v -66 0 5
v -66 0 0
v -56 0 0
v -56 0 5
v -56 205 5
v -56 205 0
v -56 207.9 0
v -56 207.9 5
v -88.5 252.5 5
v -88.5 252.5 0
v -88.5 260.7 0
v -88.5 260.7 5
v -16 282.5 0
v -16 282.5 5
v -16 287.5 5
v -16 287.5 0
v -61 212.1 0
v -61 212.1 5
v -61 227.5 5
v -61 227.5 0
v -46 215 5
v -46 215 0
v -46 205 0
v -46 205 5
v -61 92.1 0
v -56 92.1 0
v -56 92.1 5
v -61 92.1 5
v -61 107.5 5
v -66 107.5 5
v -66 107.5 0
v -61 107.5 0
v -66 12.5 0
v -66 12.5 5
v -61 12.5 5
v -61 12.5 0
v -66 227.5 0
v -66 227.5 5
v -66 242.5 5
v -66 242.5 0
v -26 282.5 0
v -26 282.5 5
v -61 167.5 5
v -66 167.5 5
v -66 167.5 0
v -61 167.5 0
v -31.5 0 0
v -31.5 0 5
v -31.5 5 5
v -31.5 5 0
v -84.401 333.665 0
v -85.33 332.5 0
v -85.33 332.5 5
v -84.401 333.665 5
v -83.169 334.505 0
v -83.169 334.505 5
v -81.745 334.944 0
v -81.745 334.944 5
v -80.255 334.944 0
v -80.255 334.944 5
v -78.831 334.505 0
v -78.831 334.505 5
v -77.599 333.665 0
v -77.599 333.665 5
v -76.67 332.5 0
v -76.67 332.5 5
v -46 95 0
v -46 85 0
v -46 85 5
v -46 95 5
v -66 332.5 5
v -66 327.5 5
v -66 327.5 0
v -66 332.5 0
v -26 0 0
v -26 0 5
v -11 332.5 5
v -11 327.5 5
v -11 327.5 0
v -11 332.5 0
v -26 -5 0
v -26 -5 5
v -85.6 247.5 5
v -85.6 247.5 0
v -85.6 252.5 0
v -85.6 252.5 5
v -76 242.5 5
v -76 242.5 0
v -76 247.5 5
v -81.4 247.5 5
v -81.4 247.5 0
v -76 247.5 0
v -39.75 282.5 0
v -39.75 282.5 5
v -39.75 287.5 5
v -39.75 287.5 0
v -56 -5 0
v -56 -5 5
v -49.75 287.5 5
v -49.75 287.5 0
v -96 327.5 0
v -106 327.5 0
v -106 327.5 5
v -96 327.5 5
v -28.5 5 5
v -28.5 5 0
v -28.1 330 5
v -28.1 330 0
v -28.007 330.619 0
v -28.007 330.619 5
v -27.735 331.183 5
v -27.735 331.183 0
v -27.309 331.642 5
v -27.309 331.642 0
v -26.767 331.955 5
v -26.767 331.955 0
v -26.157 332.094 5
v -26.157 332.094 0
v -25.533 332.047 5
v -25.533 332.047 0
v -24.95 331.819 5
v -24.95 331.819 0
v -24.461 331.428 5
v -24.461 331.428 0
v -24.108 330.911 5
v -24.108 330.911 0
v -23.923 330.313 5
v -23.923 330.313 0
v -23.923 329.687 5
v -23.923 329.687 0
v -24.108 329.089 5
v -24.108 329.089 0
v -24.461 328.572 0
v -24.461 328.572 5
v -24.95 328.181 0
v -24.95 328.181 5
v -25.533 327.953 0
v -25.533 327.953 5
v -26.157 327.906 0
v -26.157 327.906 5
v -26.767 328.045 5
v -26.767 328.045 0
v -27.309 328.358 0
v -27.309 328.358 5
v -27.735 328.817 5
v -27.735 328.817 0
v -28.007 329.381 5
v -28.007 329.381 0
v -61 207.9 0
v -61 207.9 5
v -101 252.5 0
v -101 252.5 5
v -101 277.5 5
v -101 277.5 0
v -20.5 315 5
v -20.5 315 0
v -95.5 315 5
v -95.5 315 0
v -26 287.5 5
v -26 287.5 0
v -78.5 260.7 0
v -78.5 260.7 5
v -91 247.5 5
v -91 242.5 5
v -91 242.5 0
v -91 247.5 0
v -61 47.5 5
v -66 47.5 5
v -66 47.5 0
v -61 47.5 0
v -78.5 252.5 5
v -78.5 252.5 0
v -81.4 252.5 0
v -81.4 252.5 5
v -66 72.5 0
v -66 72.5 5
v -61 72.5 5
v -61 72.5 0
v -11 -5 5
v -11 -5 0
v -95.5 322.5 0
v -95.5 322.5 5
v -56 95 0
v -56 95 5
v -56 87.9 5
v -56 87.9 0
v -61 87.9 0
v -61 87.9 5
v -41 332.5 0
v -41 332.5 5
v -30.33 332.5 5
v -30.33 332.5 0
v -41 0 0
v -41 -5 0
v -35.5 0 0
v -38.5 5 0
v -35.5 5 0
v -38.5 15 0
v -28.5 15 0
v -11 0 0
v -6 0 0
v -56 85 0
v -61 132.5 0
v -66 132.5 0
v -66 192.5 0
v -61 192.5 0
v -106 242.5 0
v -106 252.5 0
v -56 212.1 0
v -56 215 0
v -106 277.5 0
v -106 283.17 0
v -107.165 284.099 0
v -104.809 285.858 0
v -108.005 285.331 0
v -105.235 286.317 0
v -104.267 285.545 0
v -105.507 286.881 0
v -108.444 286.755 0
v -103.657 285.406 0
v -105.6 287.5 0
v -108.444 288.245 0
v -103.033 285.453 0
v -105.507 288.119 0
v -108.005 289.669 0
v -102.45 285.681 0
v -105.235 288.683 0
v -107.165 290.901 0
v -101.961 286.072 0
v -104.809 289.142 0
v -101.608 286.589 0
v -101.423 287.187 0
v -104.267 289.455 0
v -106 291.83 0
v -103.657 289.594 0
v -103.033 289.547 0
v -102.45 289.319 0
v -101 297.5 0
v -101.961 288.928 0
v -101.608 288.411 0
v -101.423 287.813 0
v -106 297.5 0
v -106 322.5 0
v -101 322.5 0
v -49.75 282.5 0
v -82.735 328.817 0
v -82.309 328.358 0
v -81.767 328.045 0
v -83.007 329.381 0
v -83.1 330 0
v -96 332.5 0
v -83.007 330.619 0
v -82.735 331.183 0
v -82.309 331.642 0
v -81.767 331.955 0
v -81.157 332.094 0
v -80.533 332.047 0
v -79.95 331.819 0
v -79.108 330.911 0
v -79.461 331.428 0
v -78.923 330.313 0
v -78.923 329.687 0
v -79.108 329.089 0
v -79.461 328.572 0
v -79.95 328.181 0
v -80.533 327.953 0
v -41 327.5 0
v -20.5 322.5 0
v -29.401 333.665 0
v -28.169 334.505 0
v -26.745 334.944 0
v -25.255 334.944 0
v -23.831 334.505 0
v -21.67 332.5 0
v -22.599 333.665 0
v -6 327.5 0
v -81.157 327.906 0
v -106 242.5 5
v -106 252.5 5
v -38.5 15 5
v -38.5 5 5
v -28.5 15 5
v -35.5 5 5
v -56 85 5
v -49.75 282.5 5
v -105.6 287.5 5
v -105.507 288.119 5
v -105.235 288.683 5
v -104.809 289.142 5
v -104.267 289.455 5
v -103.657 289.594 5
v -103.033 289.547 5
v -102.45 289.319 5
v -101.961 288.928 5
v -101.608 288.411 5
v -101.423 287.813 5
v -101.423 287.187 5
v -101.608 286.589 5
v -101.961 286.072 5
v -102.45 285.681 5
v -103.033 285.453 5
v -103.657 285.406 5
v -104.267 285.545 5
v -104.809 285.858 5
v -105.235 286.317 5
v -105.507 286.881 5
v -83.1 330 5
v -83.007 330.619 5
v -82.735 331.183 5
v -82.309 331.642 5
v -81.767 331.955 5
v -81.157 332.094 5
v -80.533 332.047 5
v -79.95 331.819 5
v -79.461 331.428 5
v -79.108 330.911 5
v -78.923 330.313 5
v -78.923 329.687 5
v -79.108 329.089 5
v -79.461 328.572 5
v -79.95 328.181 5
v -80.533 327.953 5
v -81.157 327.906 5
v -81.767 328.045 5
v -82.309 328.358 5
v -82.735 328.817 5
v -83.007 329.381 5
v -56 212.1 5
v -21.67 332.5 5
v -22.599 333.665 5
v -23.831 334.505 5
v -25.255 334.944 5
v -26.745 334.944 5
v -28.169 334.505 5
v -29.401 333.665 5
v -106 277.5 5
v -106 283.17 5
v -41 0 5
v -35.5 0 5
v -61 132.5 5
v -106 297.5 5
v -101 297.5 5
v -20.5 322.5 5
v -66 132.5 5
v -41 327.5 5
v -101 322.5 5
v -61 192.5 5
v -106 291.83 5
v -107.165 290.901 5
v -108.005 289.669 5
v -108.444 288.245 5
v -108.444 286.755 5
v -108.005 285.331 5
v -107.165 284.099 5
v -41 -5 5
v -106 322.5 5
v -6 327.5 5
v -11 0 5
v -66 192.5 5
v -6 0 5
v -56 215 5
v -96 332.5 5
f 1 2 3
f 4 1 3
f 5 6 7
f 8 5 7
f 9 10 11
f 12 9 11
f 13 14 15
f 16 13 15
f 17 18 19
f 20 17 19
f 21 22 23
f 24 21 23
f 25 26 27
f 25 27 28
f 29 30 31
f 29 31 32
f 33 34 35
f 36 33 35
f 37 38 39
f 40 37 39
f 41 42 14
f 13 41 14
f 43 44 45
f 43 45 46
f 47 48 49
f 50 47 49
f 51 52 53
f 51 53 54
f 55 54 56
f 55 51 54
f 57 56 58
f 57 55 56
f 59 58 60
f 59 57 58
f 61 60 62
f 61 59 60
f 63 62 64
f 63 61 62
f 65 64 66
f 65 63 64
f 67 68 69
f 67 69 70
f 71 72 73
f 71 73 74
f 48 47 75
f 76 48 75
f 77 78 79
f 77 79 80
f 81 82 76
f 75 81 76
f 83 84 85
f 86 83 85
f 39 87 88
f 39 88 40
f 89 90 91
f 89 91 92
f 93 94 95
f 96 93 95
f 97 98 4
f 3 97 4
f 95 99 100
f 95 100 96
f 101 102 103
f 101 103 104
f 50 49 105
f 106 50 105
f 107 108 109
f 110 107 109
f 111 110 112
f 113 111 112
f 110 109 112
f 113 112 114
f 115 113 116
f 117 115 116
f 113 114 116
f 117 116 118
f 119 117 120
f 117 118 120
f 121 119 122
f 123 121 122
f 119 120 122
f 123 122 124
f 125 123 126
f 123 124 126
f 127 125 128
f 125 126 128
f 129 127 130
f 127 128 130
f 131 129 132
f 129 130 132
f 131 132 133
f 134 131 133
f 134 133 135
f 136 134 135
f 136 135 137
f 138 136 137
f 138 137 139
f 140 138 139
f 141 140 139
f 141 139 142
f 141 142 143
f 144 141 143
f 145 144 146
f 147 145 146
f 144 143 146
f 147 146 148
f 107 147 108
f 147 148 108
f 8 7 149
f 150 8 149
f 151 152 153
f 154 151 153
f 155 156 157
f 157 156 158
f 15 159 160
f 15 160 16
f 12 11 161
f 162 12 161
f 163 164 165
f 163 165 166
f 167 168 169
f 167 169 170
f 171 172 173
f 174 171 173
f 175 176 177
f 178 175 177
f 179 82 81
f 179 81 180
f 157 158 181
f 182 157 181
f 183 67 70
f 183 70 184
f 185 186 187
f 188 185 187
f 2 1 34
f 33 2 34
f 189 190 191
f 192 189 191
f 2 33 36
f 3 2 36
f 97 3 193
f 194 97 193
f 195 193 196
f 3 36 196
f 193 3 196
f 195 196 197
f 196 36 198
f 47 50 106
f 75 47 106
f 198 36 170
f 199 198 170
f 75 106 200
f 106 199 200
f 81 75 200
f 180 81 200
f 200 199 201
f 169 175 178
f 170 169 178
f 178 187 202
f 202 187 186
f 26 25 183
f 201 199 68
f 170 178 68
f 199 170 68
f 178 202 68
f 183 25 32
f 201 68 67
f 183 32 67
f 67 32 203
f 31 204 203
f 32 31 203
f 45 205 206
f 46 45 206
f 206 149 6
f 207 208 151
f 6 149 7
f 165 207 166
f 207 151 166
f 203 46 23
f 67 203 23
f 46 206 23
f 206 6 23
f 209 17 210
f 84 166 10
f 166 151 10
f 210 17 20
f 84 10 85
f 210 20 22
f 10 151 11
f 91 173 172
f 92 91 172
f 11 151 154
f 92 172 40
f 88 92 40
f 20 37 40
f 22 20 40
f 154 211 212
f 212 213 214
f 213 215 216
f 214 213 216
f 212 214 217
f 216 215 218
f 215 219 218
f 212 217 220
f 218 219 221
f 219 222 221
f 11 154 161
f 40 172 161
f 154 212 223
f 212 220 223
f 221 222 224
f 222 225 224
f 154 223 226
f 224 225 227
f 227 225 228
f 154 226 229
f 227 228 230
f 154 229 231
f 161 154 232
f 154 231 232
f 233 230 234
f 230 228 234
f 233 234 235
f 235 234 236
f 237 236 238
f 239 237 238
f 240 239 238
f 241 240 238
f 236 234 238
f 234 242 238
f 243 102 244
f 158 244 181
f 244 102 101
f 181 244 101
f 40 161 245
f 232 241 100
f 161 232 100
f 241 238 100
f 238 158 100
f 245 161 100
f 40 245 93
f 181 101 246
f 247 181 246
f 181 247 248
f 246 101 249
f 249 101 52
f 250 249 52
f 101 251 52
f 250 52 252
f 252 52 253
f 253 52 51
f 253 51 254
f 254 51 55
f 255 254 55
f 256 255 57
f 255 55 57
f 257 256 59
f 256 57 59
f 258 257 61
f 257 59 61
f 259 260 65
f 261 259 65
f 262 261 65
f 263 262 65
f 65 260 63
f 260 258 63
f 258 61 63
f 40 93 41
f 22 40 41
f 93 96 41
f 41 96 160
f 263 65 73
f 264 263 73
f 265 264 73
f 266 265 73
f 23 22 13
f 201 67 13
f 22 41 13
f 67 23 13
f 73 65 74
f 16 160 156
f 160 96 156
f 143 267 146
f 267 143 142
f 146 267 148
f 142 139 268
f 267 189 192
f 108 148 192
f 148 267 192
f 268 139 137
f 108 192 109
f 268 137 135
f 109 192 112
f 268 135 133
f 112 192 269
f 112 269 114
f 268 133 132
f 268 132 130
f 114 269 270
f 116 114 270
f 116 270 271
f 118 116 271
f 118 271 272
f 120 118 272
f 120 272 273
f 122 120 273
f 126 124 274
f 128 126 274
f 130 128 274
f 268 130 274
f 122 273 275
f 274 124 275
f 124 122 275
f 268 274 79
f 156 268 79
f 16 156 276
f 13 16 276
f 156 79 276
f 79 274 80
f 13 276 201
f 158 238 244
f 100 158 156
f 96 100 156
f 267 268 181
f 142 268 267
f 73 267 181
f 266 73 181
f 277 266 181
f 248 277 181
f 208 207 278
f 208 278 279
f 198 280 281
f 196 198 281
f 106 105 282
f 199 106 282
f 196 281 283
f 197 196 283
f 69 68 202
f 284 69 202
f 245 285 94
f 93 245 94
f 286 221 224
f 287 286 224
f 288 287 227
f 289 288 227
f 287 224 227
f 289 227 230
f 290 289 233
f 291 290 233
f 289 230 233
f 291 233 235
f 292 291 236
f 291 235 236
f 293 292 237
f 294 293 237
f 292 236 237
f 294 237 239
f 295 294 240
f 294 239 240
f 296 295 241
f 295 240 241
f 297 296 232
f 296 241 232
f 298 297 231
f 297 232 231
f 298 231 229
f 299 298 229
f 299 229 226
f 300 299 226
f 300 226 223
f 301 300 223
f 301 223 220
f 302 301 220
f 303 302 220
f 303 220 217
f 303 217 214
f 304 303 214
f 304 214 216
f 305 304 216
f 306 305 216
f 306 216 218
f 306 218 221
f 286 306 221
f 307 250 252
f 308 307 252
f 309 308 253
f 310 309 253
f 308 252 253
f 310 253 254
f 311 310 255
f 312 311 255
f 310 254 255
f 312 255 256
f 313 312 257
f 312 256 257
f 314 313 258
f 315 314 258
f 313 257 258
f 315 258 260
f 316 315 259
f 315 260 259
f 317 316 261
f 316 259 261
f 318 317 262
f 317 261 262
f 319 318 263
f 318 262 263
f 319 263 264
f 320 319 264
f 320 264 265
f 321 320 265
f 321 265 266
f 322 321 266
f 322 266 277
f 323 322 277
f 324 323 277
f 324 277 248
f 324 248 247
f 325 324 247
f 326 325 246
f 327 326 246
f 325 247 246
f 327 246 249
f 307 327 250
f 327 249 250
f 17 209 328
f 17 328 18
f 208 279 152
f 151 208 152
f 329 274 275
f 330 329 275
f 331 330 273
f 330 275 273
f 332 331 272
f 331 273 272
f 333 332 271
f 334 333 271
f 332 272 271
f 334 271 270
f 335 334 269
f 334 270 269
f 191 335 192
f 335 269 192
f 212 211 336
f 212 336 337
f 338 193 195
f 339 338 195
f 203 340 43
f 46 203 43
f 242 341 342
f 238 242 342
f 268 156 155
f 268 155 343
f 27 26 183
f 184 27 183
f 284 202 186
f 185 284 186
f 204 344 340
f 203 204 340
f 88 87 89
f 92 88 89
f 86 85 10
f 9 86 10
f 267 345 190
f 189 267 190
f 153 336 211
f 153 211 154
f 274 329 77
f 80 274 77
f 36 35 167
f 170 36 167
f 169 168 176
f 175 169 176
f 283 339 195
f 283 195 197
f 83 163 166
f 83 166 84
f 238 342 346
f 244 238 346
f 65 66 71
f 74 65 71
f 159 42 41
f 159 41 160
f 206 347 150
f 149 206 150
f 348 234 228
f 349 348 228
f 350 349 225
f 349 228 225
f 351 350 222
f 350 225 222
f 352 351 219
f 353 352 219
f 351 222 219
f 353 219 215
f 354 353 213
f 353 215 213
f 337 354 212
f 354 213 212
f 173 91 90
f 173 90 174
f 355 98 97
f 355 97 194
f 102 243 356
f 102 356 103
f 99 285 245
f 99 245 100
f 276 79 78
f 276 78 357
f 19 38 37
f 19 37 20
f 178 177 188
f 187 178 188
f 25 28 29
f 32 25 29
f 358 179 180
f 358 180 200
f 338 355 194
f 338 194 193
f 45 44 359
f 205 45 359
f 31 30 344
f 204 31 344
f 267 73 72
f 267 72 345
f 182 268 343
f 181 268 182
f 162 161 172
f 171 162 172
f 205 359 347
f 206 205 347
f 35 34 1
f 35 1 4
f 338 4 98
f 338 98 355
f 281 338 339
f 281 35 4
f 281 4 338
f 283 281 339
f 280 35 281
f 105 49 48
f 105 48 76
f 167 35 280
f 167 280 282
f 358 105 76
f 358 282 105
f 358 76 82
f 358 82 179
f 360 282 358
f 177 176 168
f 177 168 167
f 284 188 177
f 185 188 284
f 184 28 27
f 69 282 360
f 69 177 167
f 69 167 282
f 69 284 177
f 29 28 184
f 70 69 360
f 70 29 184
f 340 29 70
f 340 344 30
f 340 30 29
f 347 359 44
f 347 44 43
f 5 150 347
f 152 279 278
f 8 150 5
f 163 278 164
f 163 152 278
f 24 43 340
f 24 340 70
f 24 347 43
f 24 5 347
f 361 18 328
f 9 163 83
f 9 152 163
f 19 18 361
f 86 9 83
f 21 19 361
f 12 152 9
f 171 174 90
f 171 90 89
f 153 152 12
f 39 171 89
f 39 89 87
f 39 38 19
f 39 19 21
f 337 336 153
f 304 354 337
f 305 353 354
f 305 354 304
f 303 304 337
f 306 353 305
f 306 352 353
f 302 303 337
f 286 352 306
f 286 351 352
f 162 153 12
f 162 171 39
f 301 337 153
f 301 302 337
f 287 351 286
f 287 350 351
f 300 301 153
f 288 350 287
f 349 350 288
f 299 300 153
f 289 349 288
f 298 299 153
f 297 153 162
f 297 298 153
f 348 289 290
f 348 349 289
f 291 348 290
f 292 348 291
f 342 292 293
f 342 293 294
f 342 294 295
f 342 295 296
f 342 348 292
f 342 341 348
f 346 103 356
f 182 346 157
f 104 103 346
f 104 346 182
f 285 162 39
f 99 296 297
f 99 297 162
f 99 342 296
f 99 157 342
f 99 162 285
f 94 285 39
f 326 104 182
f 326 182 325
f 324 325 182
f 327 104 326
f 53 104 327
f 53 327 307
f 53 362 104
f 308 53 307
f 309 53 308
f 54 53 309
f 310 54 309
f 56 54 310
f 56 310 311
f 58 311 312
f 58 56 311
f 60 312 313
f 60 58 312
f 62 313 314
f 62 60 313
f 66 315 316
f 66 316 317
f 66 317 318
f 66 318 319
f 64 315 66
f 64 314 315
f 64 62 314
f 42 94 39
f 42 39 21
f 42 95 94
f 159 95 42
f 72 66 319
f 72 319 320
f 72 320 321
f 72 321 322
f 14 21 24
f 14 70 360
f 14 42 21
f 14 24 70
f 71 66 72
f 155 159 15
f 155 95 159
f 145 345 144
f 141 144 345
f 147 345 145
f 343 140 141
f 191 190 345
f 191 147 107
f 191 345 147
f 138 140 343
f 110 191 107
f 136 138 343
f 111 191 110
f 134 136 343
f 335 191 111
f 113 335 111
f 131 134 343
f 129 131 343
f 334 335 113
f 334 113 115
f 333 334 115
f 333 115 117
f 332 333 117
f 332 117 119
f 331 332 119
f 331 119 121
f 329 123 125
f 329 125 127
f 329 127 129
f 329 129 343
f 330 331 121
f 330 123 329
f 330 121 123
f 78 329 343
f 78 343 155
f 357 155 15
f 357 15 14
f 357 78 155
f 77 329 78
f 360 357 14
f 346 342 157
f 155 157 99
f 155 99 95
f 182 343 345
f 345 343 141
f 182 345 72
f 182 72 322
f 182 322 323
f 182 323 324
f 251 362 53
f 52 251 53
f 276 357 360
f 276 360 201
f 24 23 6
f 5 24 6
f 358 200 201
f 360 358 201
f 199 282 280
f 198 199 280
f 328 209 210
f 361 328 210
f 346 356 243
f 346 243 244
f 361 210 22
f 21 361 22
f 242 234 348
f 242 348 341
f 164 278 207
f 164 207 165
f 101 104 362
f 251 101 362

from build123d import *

# Parameters (mm, degrees)
SKETCH1_W           = 106
SKETCH1_H           = 327.5
BOSS_EXTRUDE1_DEPTH = 5
SKETCH2_W           = 40
SKETCH2_H           = 242.5
CUT_EXTRUDE1_DEPTH  = 5
SKETCH3_W           = 5
SKETCH3_H           = 25
CUT_EXTRUDE2_DEPTH  = 5
SKETCH4_W           = 30
SKETCH4_H           = 5
BOSS_EXTRUDE2_DEPTH = 5
SKETCH5_W           = 15
SKETCH5_H           = 5
CUT_EXTRUDE3_DEPTH  = 5
SKETCH6_W           = 5
SKETCH6_H           = 35
CUT_EXTRUDE4_DEPTH  = 5
SKETCH7_W           = 10
SKETCH7_H           = 5
CUT_EXTRUDE5_DEPTH  = 5
SKETCH8_W           = 15
SKETCH8_H           = 5
BOSS_EXTRUDE3_DEPTH = 5
SKETCH9_W           = 70
SKETCH9_H           = 7.5
CUT_EXTRUDE6_DEPTH  = 5
SKETCH10_W          = 5
SKETCH10_H          = 227.5
BOSS_EXTRUDE4_DEPTH = 5
SKETCH11_R          = 2.1
CUT_EXTRUDE7_DEPTH  = 5
BOSS_EXTRUDE5_DEPTH = 5
SKETCH13_W          = 10
SKETCH13_H          = 327.5
SKETCH13_W_2        = 11.118393302
SKETCH13_H_2        = 31.265749724
SKETCH13_W_3        = 24.993123917
SKETCH13_H_3        = 36.030112223
CUT_EXTRUDE8_DEPTH  = 10
SKETCH14_W          = 5
SKETCH14_H          = 327.5
CUT_EXTRUDE9_DEPTH  = 1
SKETCH15_W          = 4.2
SKETCH15_H          = 5
SKETCH15_W_2        = 5
SKETCH15_H_2        = 4.2
SKETCH15_W_3        = 10
SKETCH15_H_3        = 10
CUT_EXTRUDE10_DEPTH = 10
SKETCH16_R          = 2.1
CUT_EXTRUDE11_DEPTH = 10
BOSS_EXTRUDE6_DEPTH = 5
SKETCH19_W          = 4
SKETCH19_H          = 5
CUT_EXTRUDE13_DEPTH = 5
SKETCH20_R          = 2.1
CUT_EXTRUDE14_DEPTH = 5
BOSS_EXTRUDE7_DEPTH = 5
SKETCH22_W          = 5
SKETCH22_H          = 7.5
CUT_EXTRUDE15_DEPTH = 5


with BuildPart() as part:
    # Sketch1 → Boss-Extrude1 (new body)
    with BuildSketch(Plane.XY):
        with Locations((-53, 163.75)):
            Rectangle(SKETCH1_W, SKETCH1_H)
    extrude(amount=BOSS_EXTRUDE1_DEPTH)

    # Sketch2 → Cut-Extrude1 (cut)
    with BuildSketch(Plane.XY.offset(5)):
        with Locations((-86, 121.25)):
            Rectangle(SKETCH2_W, SKETCH2_H)
    extrude(amount=-CUT_EXTRUDE1_DEPTH, mode=Mode.SUBTRACT)

    # Sketch3 → Cut-Extrude2 (cut)
    with BuildSketch(Plane.XY.offset(5)):
        with Locations((-103.5, 310)):
            Rectangle(SKETCH3_W, SKETCH3_H)
        with Locations((-103.5, 265)):
            Rectangle(SKETCH3_W, SKETCH3_H)
    extrude(amount=-CUT_EXTRUDE2_DEPTH, mode=Mode.SUBTRACT)

    # Sketch4 → Boss-Extrude2 (add)
    with BuildSketch(Plane.XY.offset(5)):
        with Locations((-26, 330)):
            Rectangle(SKETCH4_W, SKETCH4_H)
        with Locations((-81, 330)):
            Rectangle(SKETCH4_W, SKETCH4_H)
    extrude(amount=-BOSS_EXTRUDE2_DEPTH)

    # Sketch5 → Cut-Extrude3 (cut)
    with BuildSketch(Plane.XY.offset(5)):
        with Locations((-83.5, 245)):
            Rectangle(SKETCH5_W, SKETCH5_H)
    extrude(amount=-CUT_EXTRUDE3_DEPTH, mode=Mode.SUBTRACT)

    # Sketch6 → Cut-Extrude4 (cut)
    with BuildSketch(Plane.XY.offset(5)):
        with Locations((-63.5, 210)):
            Rectangle(SKETCH6_W, SKETCH6_H)
        with Locations((-63.5, 150)):
            Rectangle(SKETCH6_W, SKETCH6_H)
        with Locations((-63.5, 90)):
            Rectangle(SKETCH6_W, SKETCH6_H)
        with Locations((-63.5, 30)):
            Rectangle(SKETCH6_W, SKETCH6_H)
    extrude(amount=-CUT_EXTRUDE4_DEPTH, mode=Mode.SUBTRACT)

    # Sketch7 → Cut-Extrude5 (cut)
    with BuildSketch(Plane.XY.offset(5)):
        with Locations((-21, 285)):
            Rectangle(SKETCH7_W, SKETCH7_H)
        with Locations((-44.75, 285)):
            Rectangle(SKETCH7_W, SKETCH7_H)
    extrude(amount=-CUT_EXTRUDE5_DEPTH, mode=Mode.SUBTRACT)

    # Sketch8 → Boss-Extrude3 (add)
    with BuildSketch(Plane.XY.offset(5)):
        with Locations((-18.5, -2.5)):
            Rectangle(SKETCH8_W, SKETCH8_H)
        with Locations((-48.5, -2.5)):
            Rectangle(SKETCH8_W, SKETCH8_H)
    extrude(amount=-BOSS_EXTRUDE3_DEPTH)

    # Sketch9 → Cut-Extrude6 (cut)
    with BuildSketch(Plane(origin=(0, 0, 0), x_dir=(-1, 0, 0), z_dir=(0, 0, -1))):
        with Locations((55.5, 318.75)):
            Rectangle(SKETCH9_W, SKETCH9_H)
    extrude(amount=-CUT_EXTRUDE6_DEPTH, mode=Mode.SUBTRACT)

    # Sketch10 → Boss-Extrude4 (add)
    with BuildSketch(Plane(origin=(0, 0, 0), x_dir=(-1, 0, 0), z_dir=(0, 0, -1))):
        with Locations((-2.5, 163.75)):
            Rectangle(SKETCH10_W, SKETCH10_H)
    extrude(amount=-BOSS_EXTRUDE4_DEPTH)

    # Sketch11 → Cut-Extrude7 (cut)
    with BuildSketch(Plane(origin=(0, 0, 0), x_dir=(-1, 0, 0), z_dir=(0, 0, -1))):
        with Locations((-2.5, 75)):
            Circle(SKETCH11_R)
        with Locations((-2.5, 252.5)):
            Circle(SKETCH11_R)
    extrude(amount=-CUT_EXTRUDE7_DEPTH, mode=Mode.SUBTRACT)

    # Sketch12 → Boss-Extrude5 (add)
    with BuildSketch(Plane(origin=(0, 0, 0), x_dir=(-1, 0, 0), z_dir=(0, 0, -1))):
        with BuildLine():
            Line((-5, 70.669872981), (-5, 79.330127019))
            ThreePointArc((-5, 79.330127019), (-7.5, 75), (-5, 70.669872981))
        make_face()
        with BuildLine():
            Line((-5, 256.830127019), (-5, 248.169872981))
            ThreePointArc((-5, 248.169872981), (-7.5, 252.5), (-5, 256.830127019))
        make_face()
    extrude(amount=-BOSS_EXTRUDE5_DEPTH)

    # Sketch13 → Cut-Extrude8 (cut)
    with BuildSketch(Plane(origin=(0, 0, 0), x_dir=(-1, 0, 0), z_dir=(0, 0, -1))):
        with Locations((0, 163.75)):
            Rectangle(SKETCH13_W, SKETCH13_H)
        with Locations((-10.559196651, 252.176794505)):
            Rectangle(SKETCH13_W_2, SKETCH13_H_2)
        with Locations((-17.496561959, 79.007982861)):
            Rectangle(SKETCH13_W_3, SKETCH13_H_3)
    extrude(amount=-CUT_EXTRUDE8_DEPTH, mode=Mode.SUBTRACT)

    # Sketch14 → Cut-Extrude9 (cut)
    with BuildSketch(Plane(origin=(-5, 0, 0), x_dir=(0, 0, -1), z_dir=(1, 0, 0))):
        with Locations((-2.5, 163.75)):
            Rectangle(SKETCH14_W, SKETCH14_H)
    extrude(amount=-CUT_EXTRUDE9_DEPTH, mode=Mode.SUBTRACT)

    # Sketch15 → Cut-Extrude10 (cut)
    with BuildSketch(Plane(origin=(0, 0, 0), x_dir=(-1, 0, 0), z_dir=(0, 0, -1))):
        Polygon((78.5, 252.5), (81.4, 252.5), (85.6, 252.5), (88.5, 252.5), (88.5, 260.7), (78.5, 260.7), align=None)
        with Locations((83.5, 250)):
            Rectangle(SKETCH15_W, SKETCH15_H)
        Polygon((56, 207.9), (56, 212.1), (56, 215), (46, 215), (46, 205), (56, 205), align=None)
        with Locations((58.5, 210)):
            Rectangle(SKETCH15_W_2, SKETCH15_H_2)
        with Locations((51, 90)):
            Rectangle(SKETCH15_W_3, SKETCH15_H_3)
        with Locations((58.5, 90)):
            Rectangle(SKETCH15_W_2, SKETCH15_H_2)
    extrude(amount=-CUT_EXTRUDE10_DEPTH, mode=Mode.SUBTRACT)

    # Sketch16 → Cut-Extrude11 (cut)
    with BuildSketch(Plane(origin=(0, 0, 0), x_dir=(-1, 0, 0), z_dir=(0, 0, -1))):
        with Locations((103.5, 287.5)):
            Circle(SKETCH16_R)
    extrude(amount=-CUT_EXTRUDE11_DEPTH, mode=Mode.SUBTRACT)

    # Sketch17 → Boss-Extrude6 (add)
    with BuildSketch(Plane(origin=(0, 0, 0), x_dir=(-1, 0, 0), z_dir=(0, 0, -1))):
        with BuildLine():
            Line((106, 283.169872981), (106, 291.830127019))
            ThreePointArc((106, 291.830127019), (108.5, 287.5), (106, 283.169872981))
        make_face()
    extrude(amount=-BOSS_EXTRUDE6_DEPTH)

    # Sketch19 → Cut-Extrude13 (cut)
    with BuildSketch(Plane.XY.offset(5)):
        with Locations((-33.5, 2.5)):
            Rectangle(SKETCH19_W, SKETCH19_H)
        Polygon((-38.5, 5), (-35.5, 5), (-31.5, 5), (-28.5, 5), (-28.5, 15), (-38.5, 15), align=None)
    extrude(amount=-CUT_EXTRUDE13_DEPTH, mode=Mode.SUBTRACT)

    # Sketch20 → Cut-Extrude14 (cut)
    with BuildSketch(Plane(origin=(0, 0, 0), x_dir=(-1, 0, 0), z_dir=(0, 0, -1))):
        with Locations((26, 330)):
            Circle(SKETCH20_R)
        with Locations((81, 330)):
            Circle(SKETCH20_R)
    extrude(amount=-CUT_EXTRUDE14_DEPTH, mode=Mode.SUBTRACT)

    # Sketch21 → Boss-Extrude7 (add)
    with BuildSketch(Plane(origin=(0, 0, 0), x_dir=(-1, 0, 0), z_dir=(0, 0, -1))):
        with BuildLine():
            Line((30.330127019, 332.5), (21.669872981, 332.5))
            ThreePointArc((21.669872981, 332.5), (26, 335), (30.330127019, 332.5))
        make_face()
        with BuildLine():
            Line((76.669872981, 332.5), (85.330127019, 332.5))
            ThreePointArc((85.330127019, 332.5), (81, 335), (76.669872981, 332.5))
        make_face()
    extrude(amount=-BOSS_EXTRUDE7_DEPTH)

    # Sketch22 → Cut-Extrude15 (cut)
    with BuildSketch(Plane(origin=(0, 0, 0), x_dir=(-1, 0, 0), z_dir=(0, 0, -1))):
        with Locations((93, 318.75)):
            Rectangle(SKETCH22_W, SKETCH22_H)
    extrude(amount=-CUT_EXTRUDE15_DEPTH, mode=Mode.SUBTRACT)


solid = part.part
